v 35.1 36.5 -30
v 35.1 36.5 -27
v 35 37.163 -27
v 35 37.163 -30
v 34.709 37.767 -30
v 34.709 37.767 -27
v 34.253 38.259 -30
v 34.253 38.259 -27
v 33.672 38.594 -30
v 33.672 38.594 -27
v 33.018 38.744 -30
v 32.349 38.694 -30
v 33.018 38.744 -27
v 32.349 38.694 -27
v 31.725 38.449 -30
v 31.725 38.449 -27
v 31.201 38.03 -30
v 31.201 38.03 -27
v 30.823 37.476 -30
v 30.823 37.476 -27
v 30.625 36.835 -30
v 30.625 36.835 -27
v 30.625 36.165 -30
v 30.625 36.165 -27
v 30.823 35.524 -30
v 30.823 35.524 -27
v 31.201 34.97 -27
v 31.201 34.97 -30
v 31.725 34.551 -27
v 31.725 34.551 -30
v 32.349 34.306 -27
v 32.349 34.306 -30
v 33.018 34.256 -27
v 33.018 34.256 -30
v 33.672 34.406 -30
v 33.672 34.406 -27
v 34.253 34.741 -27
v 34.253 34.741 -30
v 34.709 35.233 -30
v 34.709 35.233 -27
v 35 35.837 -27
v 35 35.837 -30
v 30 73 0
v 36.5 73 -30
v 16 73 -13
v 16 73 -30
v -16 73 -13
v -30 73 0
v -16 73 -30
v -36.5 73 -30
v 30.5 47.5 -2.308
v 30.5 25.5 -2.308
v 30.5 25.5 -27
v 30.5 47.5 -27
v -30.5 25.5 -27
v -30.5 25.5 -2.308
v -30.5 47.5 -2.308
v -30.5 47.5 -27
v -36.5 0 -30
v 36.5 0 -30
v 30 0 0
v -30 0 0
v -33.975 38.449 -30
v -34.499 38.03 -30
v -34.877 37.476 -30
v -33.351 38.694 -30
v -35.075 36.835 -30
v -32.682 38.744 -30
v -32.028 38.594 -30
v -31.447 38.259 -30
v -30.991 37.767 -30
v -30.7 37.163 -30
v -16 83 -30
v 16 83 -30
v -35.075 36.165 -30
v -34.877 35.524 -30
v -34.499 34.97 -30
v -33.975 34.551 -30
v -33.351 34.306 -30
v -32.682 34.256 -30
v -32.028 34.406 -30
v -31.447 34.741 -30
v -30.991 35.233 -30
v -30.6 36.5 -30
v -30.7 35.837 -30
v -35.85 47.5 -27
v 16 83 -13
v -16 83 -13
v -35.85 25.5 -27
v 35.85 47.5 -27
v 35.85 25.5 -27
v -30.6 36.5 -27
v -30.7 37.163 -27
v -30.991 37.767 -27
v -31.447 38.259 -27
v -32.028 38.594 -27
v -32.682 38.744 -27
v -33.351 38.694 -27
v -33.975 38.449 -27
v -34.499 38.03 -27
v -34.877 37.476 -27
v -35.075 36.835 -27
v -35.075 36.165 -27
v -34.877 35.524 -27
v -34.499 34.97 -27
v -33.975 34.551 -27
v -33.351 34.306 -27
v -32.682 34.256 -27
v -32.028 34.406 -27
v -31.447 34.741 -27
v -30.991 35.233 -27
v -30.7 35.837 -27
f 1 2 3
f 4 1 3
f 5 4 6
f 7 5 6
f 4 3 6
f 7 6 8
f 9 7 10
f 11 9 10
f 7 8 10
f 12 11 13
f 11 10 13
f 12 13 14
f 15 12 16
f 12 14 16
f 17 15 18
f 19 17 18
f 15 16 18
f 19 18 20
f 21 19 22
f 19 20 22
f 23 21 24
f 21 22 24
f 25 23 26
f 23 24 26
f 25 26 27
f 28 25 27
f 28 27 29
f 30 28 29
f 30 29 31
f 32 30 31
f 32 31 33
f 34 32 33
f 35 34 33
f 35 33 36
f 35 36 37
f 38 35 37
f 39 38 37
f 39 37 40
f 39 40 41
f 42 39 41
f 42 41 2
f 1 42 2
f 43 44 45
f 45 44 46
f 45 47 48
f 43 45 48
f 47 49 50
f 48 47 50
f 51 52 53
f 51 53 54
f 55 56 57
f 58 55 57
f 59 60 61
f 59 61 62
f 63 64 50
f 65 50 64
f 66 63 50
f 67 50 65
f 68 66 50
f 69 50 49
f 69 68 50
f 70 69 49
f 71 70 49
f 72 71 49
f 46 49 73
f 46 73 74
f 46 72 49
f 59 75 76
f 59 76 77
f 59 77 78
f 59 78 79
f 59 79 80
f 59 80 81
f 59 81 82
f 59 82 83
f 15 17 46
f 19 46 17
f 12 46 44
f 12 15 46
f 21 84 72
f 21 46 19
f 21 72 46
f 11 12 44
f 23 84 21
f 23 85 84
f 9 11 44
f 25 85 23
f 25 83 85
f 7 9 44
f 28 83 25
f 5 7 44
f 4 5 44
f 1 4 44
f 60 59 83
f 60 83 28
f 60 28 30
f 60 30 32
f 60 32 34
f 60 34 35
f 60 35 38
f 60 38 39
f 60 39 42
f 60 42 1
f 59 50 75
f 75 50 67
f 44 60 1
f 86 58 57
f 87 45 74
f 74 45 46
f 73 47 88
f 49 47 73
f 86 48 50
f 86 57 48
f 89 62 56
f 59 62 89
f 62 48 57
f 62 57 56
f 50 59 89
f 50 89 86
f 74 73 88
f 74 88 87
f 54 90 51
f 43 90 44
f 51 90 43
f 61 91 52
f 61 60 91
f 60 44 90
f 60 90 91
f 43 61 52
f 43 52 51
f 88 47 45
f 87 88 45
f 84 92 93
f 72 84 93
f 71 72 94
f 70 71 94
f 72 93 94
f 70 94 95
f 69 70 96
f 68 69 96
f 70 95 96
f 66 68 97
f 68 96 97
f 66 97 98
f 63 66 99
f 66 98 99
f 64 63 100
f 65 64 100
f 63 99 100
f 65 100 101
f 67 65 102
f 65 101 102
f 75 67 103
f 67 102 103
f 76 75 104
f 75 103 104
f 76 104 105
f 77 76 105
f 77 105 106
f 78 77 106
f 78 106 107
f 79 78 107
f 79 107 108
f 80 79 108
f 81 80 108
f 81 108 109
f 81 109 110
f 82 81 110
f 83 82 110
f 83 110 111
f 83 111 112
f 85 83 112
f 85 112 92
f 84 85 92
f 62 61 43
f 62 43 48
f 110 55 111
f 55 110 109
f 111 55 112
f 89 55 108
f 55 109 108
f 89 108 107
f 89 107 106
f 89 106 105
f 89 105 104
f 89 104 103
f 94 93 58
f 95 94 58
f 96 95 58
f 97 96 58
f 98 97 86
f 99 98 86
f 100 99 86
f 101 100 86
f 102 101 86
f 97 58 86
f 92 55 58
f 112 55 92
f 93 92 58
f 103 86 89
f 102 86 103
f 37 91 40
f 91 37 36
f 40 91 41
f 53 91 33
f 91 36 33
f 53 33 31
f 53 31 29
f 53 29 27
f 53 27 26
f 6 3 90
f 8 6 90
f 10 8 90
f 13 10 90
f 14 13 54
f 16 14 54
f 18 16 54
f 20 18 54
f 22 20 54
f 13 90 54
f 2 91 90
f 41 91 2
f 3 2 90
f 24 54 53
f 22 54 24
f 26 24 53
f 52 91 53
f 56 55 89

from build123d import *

# Parameters (mm, degrees)
EXTRUDE_1_DEPTH     = 73
SKETCH_2_W          = 32
SKETCH_2_H          = 17
EXTRUDE_2_DEPTH     = 10
SKETCH_3_W          = 6
SKETCH_3_H          = 22
CUT_EXTRUDE_1_DEPTH = 95.605760924
SKETCH_4_R          = 2.25
CUT_EXTRUDE_2_DEPTH = 10


with BuildPart() as part:
    # 草图1 → 凸台-拉伸1 (new body)
    with BuildSketch(Plane(origin=(0, 0, 0), x_dir=(1, 0, 0), z_dir=(0, 1, 0))):
        Polygon((-36.5, 30), (36.5, 30), (30, 0), (-30, 0), align=None)
    extrude(amount=EXTRUDE_1_DEPTH)

    # 草图2 → 凸台-拉伸2 (add)
    with BuildSketch(Plane(origin=(0, 73, 0), x_dir=(1, 0, 0), z_dir=(0, 1, 0))):
        with Locations((0, 21.5)):
            Rectangle(SKETCH_2_W, SKETCH_2_H)
    extrude(amount=EXTRUDE_2_DEPTH)

    # 草图3 → 切除-拉伸1 (cut, through all)
    with BuildSketch(Plane(origin=(0, 0, -27), x_dir=(-1, 0, 0), z_dir=(0, 0, -1))):
        with Locations((-33.5, 36.5)):
            Rectangle(SKETCH_3_W, SKETCH_3_H)
        with Locations((33.5, 36.5)):
            Rectangle(SKETCH_3_W, SKETCH_3_H)
    extrude(amount=-CUT_EXTRUDE_1_DEPTH, mode=Mode.SUBTRACT)

    # 草图4 → 切除-拉伸2 (cut)
    with BuildSketch(Plane.XY.offset(-27)):
        with Locations((32.85, 36.5)):
            Circle(SKETCH_4_R)
        with Locations((-32.85, 36.5)):
            Circle(SKETCH_4_R)
    extrude(amount=-CUT_EXTRUDE_2_DEPTH, mode=Mode.SUBTRACT)


solid = part.part
